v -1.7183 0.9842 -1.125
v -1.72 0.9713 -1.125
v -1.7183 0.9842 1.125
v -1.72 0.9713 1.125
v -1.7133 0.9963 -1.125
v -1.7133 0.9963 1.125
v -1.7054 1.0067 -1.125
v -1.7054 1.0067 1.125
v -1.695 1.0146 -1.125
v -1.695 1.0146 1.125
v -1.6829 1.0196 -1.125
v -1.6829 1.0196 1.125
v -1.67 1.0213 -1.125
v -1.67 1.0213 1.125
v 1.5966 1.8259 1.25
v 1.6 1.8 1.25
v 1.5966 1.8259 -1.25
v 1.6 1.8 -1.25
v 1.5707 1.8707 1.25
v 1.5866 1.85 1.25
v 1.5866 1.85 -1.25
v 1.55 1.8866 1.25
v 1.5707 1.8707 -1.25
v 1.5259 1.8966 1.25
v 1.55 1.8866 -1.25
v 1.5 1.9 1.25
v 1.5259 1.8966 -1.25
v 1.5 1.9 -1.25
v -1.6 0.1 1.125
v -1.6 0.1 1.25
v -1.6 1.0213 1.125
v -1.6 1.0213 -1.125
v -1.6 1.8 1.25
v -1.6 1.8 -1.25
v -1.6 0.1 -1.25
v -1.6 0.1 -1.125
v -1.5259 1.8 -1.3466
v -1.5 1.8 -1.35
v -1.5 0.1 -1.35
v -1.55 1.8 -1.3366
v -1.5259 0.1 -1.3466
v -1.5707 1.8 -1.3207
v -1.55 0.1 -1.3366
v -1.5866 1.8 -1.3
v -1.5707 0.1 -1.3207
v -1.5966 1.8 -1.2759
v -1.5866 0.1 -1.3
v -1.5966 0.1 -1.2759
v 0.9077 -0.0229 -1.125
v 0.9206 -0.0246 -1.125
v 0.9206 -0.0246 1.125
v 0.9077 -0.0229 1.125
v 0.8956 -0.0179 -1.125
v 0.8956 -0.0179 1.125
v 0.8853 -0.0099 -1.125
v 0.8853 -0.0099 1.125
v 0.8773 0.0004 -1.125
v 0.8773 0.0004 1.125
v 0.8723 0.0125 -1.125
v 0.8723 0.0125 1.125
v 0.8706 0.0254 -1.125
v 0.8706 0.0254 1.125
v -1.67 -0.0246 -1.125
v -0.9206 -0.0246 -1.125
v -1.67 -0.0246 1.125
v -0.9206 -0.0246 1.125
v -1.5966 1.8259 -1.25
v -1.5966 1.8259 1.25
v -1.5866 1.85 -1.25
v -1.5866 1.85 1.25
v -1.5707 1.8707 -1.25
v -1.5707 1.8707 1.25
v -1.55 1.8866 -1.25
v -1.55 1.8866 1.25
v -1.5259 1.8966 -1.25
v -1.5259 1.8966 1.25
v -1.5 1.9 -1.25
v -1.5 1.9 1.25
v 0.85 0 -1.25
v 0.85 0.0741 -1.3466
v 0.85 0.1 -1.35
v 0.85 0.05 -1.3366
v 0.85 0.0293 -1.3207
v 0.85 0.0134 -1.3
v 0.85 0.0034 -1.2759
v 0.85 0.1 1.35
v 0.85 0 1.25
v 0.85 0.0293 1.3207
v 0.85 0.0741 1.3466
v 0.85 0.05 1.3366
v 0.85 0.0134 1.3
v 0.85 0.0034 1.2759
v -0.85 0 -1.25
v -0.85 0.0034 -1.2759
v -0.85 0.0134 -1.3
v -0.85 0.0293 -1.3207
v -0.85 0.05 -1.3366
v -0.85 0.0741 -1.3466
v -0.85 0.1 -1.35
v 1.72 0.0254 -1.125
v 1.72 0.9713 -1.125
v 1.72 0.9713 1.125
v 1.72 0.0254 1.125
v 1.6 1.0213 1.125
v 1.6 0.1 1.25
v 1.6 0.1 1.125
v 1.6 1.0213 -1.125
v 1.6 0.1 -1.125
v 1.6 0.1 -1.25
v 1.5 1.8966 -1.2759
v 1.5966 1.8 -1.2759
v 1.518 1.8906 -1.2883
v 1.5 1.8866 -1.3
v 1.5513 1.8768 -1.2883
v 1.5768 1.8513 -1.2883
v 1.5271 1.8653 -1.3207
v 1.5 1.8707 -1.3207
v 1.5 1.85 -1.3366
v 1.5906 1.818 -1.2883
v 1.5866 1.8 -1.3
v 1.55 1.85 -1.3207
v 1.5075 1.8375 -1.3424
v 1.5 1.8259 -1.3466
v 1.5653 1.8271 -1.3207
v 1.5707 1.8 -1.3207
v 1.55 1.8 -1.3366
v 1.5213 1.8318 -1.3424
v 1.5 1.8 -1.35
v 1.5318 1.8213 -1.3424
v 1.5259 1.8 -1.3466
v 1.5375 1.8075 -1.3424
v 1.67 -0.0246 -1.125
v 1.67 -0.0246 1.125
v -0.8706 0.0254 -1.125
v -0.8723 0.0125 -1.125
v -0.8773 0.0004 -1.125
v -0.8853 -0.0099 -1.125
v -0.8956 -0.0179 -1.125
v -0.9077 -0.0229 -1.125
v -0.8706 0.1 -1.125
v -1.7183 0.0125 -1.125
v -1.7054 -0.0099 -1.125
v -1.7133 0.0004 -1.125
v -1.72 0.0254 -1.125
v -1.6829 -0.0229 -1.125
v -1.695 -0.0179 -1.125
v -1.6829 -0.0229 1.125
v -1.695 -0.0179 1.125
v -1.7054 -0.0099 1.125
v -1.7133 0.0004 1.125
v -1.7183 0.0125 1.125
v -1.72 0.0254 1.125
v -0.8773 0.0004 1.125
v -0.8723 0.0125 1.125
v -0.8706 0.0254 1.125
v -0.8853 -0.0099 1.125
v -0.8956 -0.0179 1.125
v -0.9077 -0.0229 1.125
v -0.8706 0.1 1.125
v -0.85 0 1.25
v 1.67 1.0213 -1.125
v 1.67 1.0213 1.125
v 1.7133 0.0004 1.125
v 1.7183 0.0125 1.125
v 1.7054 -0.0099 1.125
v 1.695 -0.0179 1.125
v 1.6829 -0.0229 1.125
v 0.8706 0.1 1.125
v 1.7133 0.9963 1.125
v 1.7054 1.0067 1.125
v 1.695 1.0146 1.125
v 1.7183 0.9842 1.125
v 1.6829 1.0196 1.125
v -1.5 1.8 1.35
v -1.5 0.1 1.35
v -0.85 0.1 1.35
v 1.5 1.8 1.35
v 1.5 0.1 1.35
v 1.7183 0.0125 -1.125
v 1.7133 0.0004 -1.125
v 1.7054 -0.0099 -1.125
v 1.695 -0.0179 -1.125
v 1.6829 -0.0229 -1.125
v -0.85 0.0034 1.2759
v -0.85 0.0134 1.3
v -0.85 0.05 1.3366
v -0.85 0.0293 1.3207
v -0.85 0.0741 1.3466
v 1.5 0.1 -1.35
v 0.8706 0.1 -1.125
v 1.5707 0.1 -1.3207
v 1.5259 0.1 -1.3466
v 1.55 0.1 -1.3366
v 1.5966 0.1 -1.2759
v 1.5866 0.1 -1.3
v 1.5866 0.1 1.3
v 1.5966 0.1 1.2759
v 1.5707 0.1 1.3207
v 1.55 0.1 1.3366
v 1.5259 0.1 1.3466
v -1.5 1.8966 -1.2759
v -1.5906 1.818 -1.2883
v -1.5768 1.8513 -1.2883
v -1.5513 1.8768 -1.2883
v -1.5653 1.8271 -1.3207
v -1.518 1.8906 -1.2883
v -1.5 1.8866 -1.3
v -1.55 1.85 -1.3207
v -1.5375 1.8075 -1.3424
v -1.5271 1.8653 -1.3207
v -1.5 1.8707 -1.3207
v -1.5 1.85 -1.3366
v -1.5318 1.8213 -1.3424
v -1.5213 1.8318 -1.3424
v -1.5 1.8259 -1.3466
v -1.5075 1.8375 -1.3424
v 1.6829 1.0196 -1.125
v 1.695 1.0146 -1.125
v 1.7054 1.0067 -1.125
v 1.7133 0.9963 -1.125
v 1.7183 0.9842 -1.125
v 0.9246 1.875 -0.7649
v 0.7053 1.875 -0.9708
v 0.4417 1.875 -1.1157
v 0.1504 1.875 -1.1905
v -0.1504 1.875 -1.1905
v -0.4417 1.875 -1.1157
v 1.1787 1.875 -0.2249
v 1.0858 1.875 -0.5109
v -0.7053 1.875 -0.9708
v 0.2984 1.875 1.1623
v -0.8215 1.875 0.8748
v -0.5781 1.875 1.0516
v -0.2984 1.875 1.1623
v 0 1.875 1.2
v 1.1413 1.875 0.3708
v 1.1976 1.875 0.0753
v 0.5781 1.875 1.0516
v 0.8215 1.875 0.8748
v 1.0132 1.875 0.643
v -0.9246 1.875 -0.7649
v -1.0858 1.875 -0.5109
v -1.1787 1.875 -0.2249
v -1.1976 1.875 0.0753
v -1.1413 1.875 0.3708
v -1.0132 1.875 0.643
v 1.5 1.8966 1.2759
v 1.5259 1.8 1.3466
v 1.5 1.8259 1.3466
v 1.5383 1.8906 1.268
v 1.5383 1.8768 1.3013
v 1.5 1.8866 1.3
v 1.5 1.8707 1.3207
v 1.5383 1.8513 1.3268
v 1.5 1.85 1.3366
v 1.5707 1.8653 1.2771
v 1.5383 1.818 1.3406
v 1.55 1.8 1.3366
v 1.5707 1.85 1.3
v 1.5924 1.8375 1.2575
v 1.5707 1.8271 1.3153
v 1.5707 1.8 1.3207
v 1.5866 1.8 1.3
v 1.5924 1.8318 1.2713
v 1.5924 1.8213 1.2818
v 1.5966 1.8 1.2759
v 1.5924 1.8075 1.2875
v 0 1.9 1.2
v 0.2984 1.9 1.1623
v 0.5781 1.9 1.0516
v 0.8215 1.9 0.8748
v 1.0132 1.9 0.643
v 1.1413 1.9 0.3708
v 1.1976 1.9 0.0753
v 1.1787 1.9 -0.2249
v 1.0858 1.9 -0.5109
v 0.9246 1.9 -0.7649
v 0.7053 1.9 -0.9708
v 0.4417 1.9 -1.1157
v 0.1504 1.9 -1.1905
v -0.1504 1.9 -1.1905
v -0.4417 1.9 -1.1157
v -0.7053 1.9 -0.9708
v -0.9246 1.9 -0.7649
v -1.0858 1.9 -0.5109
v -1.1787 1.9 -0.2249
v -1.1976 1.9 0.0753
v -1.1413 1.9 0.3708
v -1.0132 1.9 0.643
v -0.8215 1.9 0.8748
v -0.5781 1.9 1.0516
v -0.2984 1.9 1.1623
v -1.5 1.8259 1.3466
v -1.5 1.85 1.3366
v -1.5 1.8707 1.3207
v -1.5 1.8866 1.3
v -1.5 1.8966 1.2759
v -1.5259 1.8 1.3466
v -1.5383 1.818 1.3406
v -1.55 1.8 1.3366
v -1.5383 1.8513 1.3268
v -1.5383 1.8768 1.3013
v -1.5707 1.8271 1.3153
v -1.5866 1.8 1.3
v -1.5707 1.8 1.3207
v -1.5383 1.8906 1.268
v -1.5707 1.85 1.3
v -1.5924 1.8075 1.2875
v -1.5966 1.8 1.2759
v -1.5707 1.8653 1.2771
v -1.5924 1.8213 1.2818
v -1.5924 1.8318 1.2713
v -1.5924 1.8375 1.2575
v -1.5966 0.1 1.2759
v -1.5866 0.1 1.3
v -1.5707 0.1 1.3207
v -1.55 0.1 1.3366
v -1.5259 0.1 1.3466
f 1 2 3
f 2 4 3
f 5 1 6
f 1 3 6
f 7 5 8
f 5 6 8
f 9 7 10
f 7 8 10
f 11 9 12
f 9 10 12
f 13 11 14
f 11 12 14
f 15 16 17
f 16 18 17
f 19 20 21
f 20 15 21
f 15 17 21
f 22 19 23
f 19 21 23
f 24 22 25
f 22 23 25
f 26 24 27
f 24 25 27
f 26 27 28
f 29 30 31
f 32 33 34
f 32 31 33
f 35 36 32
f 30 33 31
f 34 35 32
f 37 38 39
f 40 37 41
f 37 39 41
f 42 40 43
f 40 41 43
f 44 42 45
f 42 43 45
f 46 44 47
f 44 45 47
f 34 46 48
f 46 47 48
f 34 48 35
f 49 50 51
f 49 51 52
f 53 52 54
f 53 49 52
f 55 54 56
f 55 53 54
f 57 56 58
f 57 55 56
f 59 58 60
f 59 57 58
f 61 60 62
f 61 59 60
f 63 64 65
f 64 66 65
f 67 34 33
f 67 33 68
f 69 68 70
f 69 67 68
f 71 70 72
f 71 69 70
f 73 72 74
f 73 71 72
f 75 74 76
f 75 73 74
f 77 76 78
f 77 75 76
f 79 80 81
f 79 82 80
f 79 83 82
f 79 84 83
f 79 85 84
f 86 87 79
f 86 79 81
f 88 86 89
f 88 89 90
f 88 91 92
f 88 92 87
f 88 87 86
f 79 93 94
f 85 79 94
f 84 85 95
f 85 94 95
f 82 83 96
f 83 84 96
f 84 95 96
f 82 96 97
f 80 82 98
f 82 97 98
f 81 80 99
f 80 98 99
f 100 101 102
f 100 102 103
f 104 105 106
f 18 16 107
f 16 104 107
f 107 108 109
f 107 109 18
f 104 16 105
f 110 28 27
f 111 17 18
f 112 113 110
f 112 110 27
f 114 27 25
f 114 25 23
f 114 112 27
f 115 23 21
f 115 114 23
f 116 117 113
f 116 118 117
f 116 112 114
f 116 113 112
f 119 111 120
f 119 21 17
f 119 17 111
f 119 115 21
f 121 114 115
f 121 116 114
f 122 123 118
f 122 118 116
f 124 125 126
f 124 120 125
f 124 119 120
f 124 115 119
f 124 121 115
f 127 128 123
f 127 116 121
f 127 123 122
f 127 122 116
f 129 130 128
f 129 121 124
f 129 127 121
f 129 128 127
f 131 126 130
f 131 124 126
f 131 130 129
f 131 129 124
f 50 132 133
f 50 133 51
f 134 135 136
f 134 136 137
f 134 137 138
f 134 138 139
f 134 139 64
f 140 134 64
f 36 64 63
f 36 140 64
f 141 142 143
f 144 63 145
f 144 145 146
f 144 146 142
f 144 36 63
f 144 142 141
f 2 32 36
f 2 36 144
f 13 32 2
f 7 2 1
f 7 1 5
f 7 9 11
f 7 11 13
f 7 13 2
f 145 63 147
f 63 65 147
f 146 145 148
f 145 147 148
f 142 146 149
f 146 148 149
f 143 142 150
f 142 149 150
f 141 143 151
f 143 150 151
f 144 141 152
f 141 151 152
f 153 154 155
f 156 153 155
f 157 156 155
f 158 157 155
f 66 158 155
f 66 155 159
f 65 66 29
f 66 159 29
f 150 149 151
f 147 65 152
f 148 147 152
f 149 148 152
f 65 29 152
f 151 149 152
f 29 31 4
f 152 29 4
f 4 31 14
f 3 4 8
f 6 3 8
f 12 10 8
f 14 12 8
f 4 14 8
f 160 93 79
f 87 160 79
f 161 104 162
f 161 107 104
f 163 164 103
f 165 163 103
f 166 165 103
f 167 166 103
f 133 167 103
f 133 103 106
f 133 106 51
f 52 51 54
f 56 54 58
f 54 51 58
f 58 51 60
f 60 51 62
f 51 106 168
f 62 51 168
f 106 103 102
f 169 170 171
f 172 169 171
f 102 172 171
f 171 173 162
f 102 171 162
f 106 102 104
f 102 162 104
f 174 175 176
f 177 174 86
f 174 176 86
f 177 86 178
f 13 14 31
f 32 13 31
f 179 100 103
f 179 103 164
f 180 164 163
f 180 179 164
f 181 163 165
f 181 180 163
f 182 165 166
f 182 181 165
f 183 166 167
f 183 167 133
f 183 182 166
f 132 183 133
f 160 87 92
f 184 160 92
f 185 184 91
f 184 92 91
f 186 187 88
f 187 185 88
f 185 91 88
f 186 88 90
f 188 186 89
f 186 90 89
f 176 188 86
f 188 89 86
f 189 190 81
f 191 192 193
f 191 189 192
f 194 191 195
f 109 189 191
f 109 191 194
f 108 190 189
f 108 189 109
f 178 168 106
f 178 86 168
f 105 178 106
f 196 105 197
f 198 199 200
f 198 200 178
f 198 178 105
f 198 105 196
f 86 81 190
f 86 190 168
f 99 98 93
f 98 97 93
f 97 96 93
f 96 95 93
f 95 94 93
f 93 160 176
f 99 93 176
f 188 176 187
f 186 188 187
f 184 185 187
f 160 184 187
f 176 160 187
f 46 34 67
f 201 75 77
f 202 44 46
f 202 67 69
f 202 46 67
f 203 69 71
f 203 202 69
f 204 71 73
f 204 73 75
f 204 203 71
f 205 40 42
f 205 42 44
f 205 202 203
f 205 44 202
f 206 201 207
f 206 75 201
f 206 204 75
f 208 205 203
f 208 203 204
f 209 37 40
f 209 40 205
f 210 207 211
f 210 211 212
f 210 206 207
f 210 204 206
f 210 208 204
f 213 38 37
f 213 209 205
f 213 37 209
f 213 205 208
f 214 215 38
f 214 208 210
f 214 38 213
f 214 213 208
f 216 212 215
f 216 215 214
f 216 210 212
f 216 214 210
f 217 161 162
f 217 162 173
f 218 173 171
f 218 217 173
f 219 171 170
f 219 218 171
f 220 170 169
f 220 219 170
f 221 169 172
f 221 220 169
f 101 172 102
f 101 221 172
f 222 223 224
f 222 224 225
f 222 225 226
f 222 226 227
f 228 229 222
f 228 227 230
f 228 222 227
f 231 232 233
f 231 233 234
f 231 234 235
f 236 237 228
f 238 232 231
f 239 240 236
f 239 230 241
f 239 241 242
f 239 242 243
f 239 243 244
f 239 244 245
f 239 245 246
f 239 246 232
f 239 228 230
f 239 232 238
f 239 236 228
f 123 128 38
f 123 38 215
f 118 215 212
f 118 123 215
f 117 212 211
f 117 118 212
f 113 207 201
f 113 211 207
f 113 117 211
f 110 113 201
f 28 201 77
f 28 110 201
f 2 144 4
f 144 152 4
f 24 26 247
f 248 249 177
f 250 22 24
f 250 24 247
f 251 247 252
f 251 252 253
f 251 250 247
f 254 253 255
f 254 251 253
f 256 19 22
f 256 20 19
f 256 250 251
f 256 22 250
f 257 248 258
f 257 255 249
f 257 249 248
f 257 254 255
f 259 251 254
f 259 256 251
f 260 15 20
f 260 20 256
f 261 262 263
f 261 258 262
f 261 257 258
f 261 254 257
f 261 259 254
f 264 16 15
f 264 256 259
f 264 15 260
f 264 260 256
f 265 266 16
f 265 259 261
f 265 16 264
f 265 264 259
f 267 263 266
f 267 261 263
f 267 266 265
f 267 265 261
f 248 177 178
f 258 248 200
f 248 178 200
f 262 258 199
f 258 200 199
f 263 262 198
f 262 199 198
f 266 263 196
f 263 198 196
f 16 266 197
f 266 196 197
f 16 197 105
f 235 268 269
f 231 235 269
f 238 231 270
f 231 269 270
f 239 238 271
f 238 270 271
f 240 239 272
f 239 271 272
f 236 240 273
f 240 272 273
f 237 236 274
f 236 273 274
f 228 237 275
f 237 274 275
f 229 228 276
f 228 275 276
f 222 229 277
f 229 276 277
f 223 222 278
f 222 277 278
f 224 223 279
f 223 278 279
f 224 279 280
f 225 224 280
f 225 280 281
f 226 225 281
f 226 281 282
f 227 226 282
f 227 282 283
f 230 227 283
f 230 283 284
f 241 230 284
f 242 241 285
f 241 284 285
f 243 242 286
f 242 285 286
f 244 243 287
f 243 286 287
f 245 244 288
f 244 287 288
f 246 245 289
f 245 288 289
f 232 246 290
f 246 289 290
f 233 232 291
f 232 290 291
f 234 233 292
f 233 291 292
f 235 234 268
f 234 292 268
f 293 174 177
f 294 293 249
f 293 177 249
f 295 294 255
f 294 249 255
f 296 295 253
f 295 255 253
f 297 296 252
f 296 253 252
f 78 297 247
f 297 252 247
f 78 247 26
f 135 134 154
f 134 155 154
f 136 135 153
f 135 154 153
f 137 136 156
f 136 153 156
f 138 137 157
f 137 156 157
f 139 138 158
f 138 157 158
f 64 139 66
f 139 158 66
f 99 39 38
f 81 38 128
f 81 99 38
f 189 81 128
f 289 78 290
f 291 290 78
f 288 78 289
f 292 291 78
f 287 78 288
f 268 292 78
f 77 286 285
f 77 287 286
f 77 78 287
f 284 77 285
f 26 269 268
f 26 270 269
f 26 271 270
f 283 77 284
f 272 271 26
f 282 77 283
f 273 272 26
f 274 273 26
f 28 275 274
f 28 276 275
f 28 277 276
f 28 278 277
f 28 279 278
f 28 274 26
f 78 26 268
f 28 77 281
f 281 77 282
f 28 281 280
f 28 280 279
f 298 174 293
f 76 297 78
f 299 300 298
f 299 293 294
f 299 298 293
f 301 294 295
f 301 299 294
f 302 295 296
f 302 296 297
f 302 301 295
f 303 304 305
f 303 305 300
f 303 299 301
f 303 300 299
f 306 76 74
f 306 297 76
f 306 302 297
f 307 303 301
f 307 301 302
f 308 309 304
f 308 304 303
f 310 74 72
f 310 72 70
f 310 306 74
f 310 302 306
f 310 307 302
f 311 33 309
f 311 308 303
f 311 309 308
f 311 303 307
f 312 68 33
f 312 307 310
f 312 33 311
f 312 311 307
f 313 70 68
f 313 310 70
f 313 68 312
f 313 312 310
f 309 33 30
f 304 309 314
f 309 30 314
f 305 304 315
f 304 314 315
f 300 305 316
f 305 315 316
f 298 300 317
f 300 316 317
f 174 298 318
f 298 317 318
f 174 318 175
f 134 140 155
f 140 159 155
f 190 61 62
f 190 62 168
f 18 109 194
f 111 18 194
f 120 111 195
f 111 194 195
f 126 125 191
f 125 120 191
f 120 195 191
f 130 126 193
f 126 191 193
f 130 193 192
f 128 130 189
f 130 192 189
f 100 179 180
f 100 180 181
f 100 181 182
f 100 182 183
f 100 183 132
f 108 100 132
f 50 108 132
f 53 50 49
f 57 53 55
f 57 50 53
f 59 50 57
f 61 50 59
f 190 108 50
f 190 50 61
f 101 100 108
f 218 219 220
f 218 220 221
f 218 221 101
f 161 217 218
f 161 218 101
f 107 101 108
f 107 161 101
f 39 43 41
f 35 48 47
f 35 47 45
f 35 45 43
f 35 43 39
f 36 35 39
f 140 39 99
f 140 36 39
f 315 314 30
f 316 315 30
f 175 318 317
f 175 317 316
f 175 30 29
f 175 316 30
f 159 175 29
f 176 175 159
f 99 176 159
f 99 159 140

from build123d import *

# Parameters (mm, degrees)
SKETCH_2_W          = 3.2
SKETCH_2_H          = 2.7
EXTRUDE_1_DEPTH     = 1.9
FILLET_1_R          = 0.1
FILLET_2_R          = 0.1
FILLET_3_R          = 0.1
FILLET_4_R          = 0.1
FILLET_5_R          = 0.1
SKETCH_3_R          = 1.2
CUT_EXTRUDE_1_DEPTH = 0.025
SKETCH_4_W          = 0.827754981
SKETCH_4_H          = 2.835918068
CUT_EXTRUDE_2_DEPTH = 0.1
EXTRUDE_3_DEPTH     = 1.125


with BuildPart() as part:
    # Эскиз2 → Бобышка-Вытянуть1 (new body)
    with BuildSketch(Plane(origin=(0, 0, 0), x_dir=(1, 0, 0), z_dir=(0, 1, 0))):
        Rectangle(SKETCH_2_W, SKETCH_2_H)
    extrude(amount=EXTRUDE_1_DEPTH)

    # Скругление1
    fillet_1_edges = [part.edges().sort_by_distance(p)[0] for p in [
        (-1.6, 1.9, 0),
        (0, 1.9, 1.35),
        (1.6, 1.9, 0),
        (0, 1.9, -1.35),
    ]]
    fillet(fillet_1_edges, radius=FILLET_1_R)

    # Скругление2
    # the kernel refuses this fillet: 0.1 mm, written as the material it takes off along each edge
    with BuildSketch(Plane(origin=(-1.5, 1.8, 1.25), x_dir=(0, 0, 1), z_dir=(-1, 0, 0))) as fillet_2_piece_1_section:
        Polygon((0, 0), (FILLET_2_R, 0), (FILLET_2_R, FILLET_2_R), (0, FILLET_2_R), align=None)
    fillet_2_piece_1 = extrude(amount=FILLET_2_R, mode=Mode.PRIVATE)
    fillet_2_piece_1 = fillet_2_piece_1 - Plane(origin=(-1.5, 1.8, 1.25), x_dir=(0, -0.7071067811865475, -0.7071067811865475), z_dir=(-1, 0, 0)) * Sphere(FILLET_2_R, mode=Mode.PRIVATE)
    add(fillet_2_piece_1, mode=Mode.SUBTRACT)
    with BuildSketch(Plane(origin=(1.5, 1.8, 1.25), x_dir=(0, 0, 1), z_dir=(1, 0, 0))) as fillet_2_piece_2_section:
        Polygon((0, 0), (FILLET_2_R, 0), (FILLET_2_R, -FILLET_2_R), (0, -FILLET_2_R), align=None)
    fillet_2_piece_2 = extrude(amount=FILLET_2_R, mode=Mode.PRIVATE)
    fillet_2_piece_2 = fillet_2_piece_2 - Plane(origin=(1.5, 1.8, 1.25), x_dir=(0, -0.7071067811865475, -0.7071067811865475), z_dir=(1, 0, 0)) * Sphere(FILLET_2_R, mode=Mode.PRIVATE)
    add(fillet_2_piece_2, mode=Mode.SUBTRACT)
    with BuildSketch(Plane(origin=(1.6, -0.25, 1.35), x_dir=(0, 0, -1), z_dir=(0, 1, 0))) as fillet_2_piece_3:
        with BuildLine():
            CenterArc((FILLET_2_R, FILLET_2_R), FILLET_2_R, 180, 90)
            Line((0, FILLET_2_R), (0, 0))
            Line((0, 0), (FILLET_2_R, 0))
        make_face()
    extrude(amount=2.05, mode=Mode.SUBTRACT)
    with BuildSketch(Plane(origin=(-1.6, -0.25, 1.35), x_dir=(0, 0, -1), z_dir=(0, 1, 0))) as fillet_2_piece_4:
        with BuildLine():
            CenterArc((FILLET_2_R, -FILLET_2_R), FILLET_2_R, 90, 90)
            Line((0, -FILLET_2_R), (0, 0))
            Line((0, 0), (FILLET_2_R, 0))
        make_face()
    extrude(amount=2.05, mode=Mode.SUBTRACT)
    with BuildSketch(Plane(origin=(1.85, 0, 1.35), x_dir=(0, 0, -1), z_dir=(-1, 0, 0))) as fillet_2_piece_5:
        with BuildLine():
            CenterArc((FILLET_2_R, -FILLET_2_R), FILLET_2_R, 90, 90)
            Line((0, -FILLET_2_R), (0, 0))
            Line((0, 0), (FILLET_2_R, 0))
        make_face()
    extrude(amount=3.7, mode=Mode.SUBTRACT)

    # Скругление3
    # the kernel refuses this fillet: 0.1 mm, written as the material it takes off along each edge
    with BuildSketch(Plane(origin=(1.5, 1.8, -1.25), x_dir=(1, 0, 0), z_dir=(0, 0, -1))) as fillet_3_piece_1_section:
        Polygon((0, 0), (FILLET_3_R, 0), (FILLET_3_R, -FILLET_3_R), (0, -FILLET_3_R), align=None)
    fillet_3_piece_1 = extrude(amount=FILLET_3_R, mode=Mode.PRIVATE)
    fillet_3_piece_1 = fillet_3_piece_1 - Plane(origin=(1.5, 1.8, -1.25), x_dir=(-0.7071067811865475, -0.7071067811865475, 0), z_dir=(0, 0, -1)) * Sphere(FILLET_3_R, mode=Mode.PRIVATE)
    add(fillet_3_piece_1, mode=Mode.SUBTRACT)
    with BuildSketch(Plane(origin=(1.5, 0.1, 1.25), x_dir=(1, 0, 0), z_dir=(0, -1, 0))) as fillet_3_piece_2_section:
        Polygon((0, 0), (FILLET_3_R, 0), (FILLET_3_R, FILLET_3_R), (0, FILLET_3_R), align=None)
    fillet_3_piece_2 = extrude(amount=FILLET_3_R, mode=Mode.PRIVATE)
    fillet_3_piece_2 = fillet_3_piece_2 - Plane(origin=(1.5, 0.1, 1.25), x_dir=(-0.7071067811865476, 0, -0.7071067811865475), z_dir=(0, -1, 0)) * Sphere(FILLET_3_R, mode=Mode.PRIVATE)
    add(fillet_3_piece_2, mode=Mode.SUBTRACT)
    with BuildSketch(Plane(origin=(1.6, -0.25, -1.35), x_dir=(-1, 0, 0), z_dir=(0, 1, 0))) as fillet_3_piece_3:
        with BuildLine():
            CenterArc((FILLET_3_R, FILLET_3_R), FILLET_3_R, 180, 90)
            Line((0, FILLET_3_R), (0, 0))
            Line((0, 0), (FILLET_3_R, 0))
        make_face()
    extrude(amount=2.05, mode=Mode.SUBTRACT)
    with BuildSketch(Plane(origin=(1.6, 0, -1.6), x_dir=(-1, 0, 0), z_dir=(0, 0, 1))) as fillet_3_piece_4:
        with BuildLine():
            CenterArc((FILLET_3_R, -FILLET_3_R), FILLET_3_R, 90, 90)
            Line((0, -FILLET_3_R), (0, 0))
            Line((0, 0), (FILLET_3_R, 0))
        make_face()
    extrude(amount=2.85, mode=Mode.SUBTRACT)

    # Скругление4
    # the kernel refuses this fillet: 0.1 mm, written as the material it takes off along each edge
    with BuildSketch(Plane(origin=(-1.5, 1.8, -1.25), x_dir=(-1, 0, 0), z_dir=(0, 0, -1))) as fillet_4_piece_1_section:
        Polygon((0, 0), (FILLET_4_R, 0), (FILLET_4_R, FILLET_4_R), (0, FILLET_4_R), align=None)
    fillet_4_piece_1 = extrude(amount=FILLET_4_R, mode=Mode.PRIVATE)
    fillet_4_piece_1 = fillet_4_piece_1 - Plane(origin=(-1.5, 1.8, -1.25), x_dir=(0.7071067811865475, -0.7071067811865475, 0), z_dir=(0, 0, -1)) * Sphere(FILLET_4_R, mode=Mode.PRIVATE)
    add(fillet_4_piece_1, mode=Mode.SUBTRACT)
    with BuildSketch(Plane(origin=(1.5, 0.1, -1.25), x_dir=(0, -1, 0), z_dir=(0, 0, -1))) as fillet_4_piece_2_section:
        Polygon((0, 0), (FILLET_4_R, 0), (FILLET_4_R, -FILLET_4_R), (0, -FILLET_4_R), align=None)
    fillet_4_piece_2 = extrude(amount=FILLET_4_R, mode=Mode.PRIVATE)
    fillet_4_piece_2 = fillet_4_piece_2 - Plane(origin=(1.5, 0.1, -1.25), x_dir=(-0.7071067811865475, 0.7071067811865475, 0), z_dir=(0, 0, -1)) * Sphere(FILLET_4_R, mode=Mode.PRIVATE)
    add(fillet_4_piece_2, mode=Mode.SUBTRACT)
    with BuildSketch(Plane(origin=(-1.6, -0.25, -1.35), x_dir=(1, 0, 0), z_dir=(0, 1, 0))) as fillet_4_piece_3:
        with BuildLine():
            CenterArc((FILLET_4_R, -FILLET_4_R), FILLET_4_R, 90, 90)
            Line((0, -FILLET_4_R), (0, 0))
            Line((0, 0), (FILLET_4_R, 0))
        make_face()
    extrude(amount=2.05, mode=Mode.SUBTRACT)
    with BuildSketch(Plane(origin=(-1.85, 0, -1.35), x_dir=(0, 1, 0), z_dir=(1, 0, 0))) as fillet_4_piece_4:
        with BuildLine():
            CenterArc((FILLET_4_R, FILLET_4_R), FILLET_4_R, 180, 90)
            Line((0, FILLET_4_R), (0, 0))
            Line((0, 0), (FILLET_4_R, 0))
        make_face()
    extrude(amount=3.35, mode=Mode.SUBTRACT)

    # Скругление5
    # the kernel refuses this fillet: 0.1 mm, written as the material it takes off along each edge
    with BuildSketch(Plane(origin=(-1.5, 0.1, 1.25), x_dir=(-1, 0, 0), z_dir=(0, -1, 0))) as fillet_5_piece_1_section:
        Polygon((0, 0), (FILLET_5_R, 0), (FILLET_5_R, -FILLET_5_R), (0, -FILLET_5_R), align=None)
    fillet_5_piece_1 = extrude(amount=FILLET_5_R, mode=Mode.PRIVATE)
    fillet_5_piece_1 = fillet_5_piece_1 - Plane(origin=(-1.5, 0.1, 1.25), x_dir=(0.7071067811865475, 0, -0.7071067811865477), z_dir=(0, -1, 0)) * Sphere(FILLET_5_R, mode=Mode.PRIVATE)
    add(fillet_5_piece_1, mode=Mode.SUBTRACT)
    with BuildSketch(Plane(origin=(-1.5, 0.1, -1.25), x_dir=(-1, 0, 0), z_dir=(0, -1, 0))) as fillet_5_piece_2_section:
        Polygon((0, 0), (FILLET_5_R, 0), (FILLET_5_R, FILLET_5_R), (0, FILLET_5_R), align=None)
    fillet_5_piece_2 = extrude(amount=FILLET_5_R, mode=Mode.PRIVATE)
    fillet_5_piece_2 = fillet_5_piece_2 - Plane(origin=(-1.5, 0.1, -1.25), x_dir=(0.7071067811865476, 0, 0.7071067811865475), z_dir=(0, -1, 0)) * Sphere(FILLET_5_R, mode=Mode.PRIVATE)
    add(fillet_5_piece_2, mode=Mode.SUBTRACT)
    with BuildSketch(Plane(origin=(-1.6, 0, 1.25), x_dir=(1, 0, 0), z_dir=(0, 0, -1))) as fillet_5_piece_3:
        with BuildLine():
            CenterArc((FILLET_5_R, -FILLET_5_R), FILLET_5_R, 90, 90)
            Line((0, -FILLET_5_R), (0, 0))
            Line((0, 0), (FILLET_5_R, 0))
        make_face()
    extrude(amount=2.5, mode=Mode.SUBTRACT)

    # Эскиз3 → Вырез-Вытянуть1 (cut)
    with BuildSketch(Plane(origin=(0, 1.9, 0), x_dir=(1, 0, 0), z_dir=(0, 1, 0))):
        with Locations(Location((0, 0, 0), (0, 0, 270))):
            Circle(SKETCH_3_R)
    extrude(amount=-CUT_EXTRUDE_1_DEPTH, mode=Mode.SUBTRACT)

    # Эскиз4 → Вырез-Вытянуть2 (cut)
    with BuildSketch(Plane.XZ):
        with Locations((1.263877491, 0.001548995)):
            Rectangle(SKETCH_4_W, SKETCH_4_H)
        with Locations((-1.263877491, 0.001548995)):
            Rectangle(SKETCH_4_W, SKETCH_4_H)
    extrude(amount=-CUT_EXTRUDE_2_DEPTH, mode=Mode.SUBTRACT)

    # Эскиз6 → Бобышка-Вытянуть3 (add, symmetric)
    with BuildSketch(Plane(origin=(0, 0, 0), x_dir=(-1, 0, 0), z_dir=(0, 0, -1))):
        with BuildLine():
            Line((1.6, 0.1), (0.87063337, 0.1))
            Line((0.87063337, 0.1), (0.87063337, 0.025437095))
            ThreePointArc((0.87063337, 0.025437095), (0.885278031, -0.009918244), (0.92063337, -0.024562905))
            Line((0.92063337, -0.024562905), (1.67, -0.024562905))
            ThreePointArc((1.67, -0.024562905), (1.705355339, -0.009918244), (1.72, 0.025437095))
            Line((1.72, 0.025437095), (1.72, 0.971300934))
            ThreePointArc((1.72, 0.971300934), (1.705355339, 1.006656273), (1.67, 1.021300934))
            Line((1.67, 1.021300934), (1.6, 1.021300934))
            Line((1.6, 1.021300934), (1.6, 0.1))
        make_face()
        with BuildLine():
            Line((-1.6, 1.021300934), (-1.67, 1.021300934))
            ThreePointArc((-1.67, 1.021300934), (-1.705355339, 1.006656273), (-1.72, 0.971300934))
            Line((-1.72, 0.971300934), (-1.72, 0.025437095))
            ThreePointArc((-1.72, 0.025437095), (-1.705355339, -0.009918244), (-1.67, -0.024562905))
            Line((-1.67, -0.024562905), (-0.92063337, -0.024562905))
            ThreePointArc((-0.92063337, -0.024562905), (-0.885278031, -0.009918244), (-0.87063337, 0.025437095))
            Line((-0.87063337, 0.025437095), (-0.87063337, 0.1))
            Line((-0.87063337, 0.1), (-1.6, 0.1))
            Line((-1.6, 0.1), (-1.6, 1.021300934))
        make_face()
    extrude(amount=EXTRUDE_3_DEPTH, both=True)


solid = part.part
